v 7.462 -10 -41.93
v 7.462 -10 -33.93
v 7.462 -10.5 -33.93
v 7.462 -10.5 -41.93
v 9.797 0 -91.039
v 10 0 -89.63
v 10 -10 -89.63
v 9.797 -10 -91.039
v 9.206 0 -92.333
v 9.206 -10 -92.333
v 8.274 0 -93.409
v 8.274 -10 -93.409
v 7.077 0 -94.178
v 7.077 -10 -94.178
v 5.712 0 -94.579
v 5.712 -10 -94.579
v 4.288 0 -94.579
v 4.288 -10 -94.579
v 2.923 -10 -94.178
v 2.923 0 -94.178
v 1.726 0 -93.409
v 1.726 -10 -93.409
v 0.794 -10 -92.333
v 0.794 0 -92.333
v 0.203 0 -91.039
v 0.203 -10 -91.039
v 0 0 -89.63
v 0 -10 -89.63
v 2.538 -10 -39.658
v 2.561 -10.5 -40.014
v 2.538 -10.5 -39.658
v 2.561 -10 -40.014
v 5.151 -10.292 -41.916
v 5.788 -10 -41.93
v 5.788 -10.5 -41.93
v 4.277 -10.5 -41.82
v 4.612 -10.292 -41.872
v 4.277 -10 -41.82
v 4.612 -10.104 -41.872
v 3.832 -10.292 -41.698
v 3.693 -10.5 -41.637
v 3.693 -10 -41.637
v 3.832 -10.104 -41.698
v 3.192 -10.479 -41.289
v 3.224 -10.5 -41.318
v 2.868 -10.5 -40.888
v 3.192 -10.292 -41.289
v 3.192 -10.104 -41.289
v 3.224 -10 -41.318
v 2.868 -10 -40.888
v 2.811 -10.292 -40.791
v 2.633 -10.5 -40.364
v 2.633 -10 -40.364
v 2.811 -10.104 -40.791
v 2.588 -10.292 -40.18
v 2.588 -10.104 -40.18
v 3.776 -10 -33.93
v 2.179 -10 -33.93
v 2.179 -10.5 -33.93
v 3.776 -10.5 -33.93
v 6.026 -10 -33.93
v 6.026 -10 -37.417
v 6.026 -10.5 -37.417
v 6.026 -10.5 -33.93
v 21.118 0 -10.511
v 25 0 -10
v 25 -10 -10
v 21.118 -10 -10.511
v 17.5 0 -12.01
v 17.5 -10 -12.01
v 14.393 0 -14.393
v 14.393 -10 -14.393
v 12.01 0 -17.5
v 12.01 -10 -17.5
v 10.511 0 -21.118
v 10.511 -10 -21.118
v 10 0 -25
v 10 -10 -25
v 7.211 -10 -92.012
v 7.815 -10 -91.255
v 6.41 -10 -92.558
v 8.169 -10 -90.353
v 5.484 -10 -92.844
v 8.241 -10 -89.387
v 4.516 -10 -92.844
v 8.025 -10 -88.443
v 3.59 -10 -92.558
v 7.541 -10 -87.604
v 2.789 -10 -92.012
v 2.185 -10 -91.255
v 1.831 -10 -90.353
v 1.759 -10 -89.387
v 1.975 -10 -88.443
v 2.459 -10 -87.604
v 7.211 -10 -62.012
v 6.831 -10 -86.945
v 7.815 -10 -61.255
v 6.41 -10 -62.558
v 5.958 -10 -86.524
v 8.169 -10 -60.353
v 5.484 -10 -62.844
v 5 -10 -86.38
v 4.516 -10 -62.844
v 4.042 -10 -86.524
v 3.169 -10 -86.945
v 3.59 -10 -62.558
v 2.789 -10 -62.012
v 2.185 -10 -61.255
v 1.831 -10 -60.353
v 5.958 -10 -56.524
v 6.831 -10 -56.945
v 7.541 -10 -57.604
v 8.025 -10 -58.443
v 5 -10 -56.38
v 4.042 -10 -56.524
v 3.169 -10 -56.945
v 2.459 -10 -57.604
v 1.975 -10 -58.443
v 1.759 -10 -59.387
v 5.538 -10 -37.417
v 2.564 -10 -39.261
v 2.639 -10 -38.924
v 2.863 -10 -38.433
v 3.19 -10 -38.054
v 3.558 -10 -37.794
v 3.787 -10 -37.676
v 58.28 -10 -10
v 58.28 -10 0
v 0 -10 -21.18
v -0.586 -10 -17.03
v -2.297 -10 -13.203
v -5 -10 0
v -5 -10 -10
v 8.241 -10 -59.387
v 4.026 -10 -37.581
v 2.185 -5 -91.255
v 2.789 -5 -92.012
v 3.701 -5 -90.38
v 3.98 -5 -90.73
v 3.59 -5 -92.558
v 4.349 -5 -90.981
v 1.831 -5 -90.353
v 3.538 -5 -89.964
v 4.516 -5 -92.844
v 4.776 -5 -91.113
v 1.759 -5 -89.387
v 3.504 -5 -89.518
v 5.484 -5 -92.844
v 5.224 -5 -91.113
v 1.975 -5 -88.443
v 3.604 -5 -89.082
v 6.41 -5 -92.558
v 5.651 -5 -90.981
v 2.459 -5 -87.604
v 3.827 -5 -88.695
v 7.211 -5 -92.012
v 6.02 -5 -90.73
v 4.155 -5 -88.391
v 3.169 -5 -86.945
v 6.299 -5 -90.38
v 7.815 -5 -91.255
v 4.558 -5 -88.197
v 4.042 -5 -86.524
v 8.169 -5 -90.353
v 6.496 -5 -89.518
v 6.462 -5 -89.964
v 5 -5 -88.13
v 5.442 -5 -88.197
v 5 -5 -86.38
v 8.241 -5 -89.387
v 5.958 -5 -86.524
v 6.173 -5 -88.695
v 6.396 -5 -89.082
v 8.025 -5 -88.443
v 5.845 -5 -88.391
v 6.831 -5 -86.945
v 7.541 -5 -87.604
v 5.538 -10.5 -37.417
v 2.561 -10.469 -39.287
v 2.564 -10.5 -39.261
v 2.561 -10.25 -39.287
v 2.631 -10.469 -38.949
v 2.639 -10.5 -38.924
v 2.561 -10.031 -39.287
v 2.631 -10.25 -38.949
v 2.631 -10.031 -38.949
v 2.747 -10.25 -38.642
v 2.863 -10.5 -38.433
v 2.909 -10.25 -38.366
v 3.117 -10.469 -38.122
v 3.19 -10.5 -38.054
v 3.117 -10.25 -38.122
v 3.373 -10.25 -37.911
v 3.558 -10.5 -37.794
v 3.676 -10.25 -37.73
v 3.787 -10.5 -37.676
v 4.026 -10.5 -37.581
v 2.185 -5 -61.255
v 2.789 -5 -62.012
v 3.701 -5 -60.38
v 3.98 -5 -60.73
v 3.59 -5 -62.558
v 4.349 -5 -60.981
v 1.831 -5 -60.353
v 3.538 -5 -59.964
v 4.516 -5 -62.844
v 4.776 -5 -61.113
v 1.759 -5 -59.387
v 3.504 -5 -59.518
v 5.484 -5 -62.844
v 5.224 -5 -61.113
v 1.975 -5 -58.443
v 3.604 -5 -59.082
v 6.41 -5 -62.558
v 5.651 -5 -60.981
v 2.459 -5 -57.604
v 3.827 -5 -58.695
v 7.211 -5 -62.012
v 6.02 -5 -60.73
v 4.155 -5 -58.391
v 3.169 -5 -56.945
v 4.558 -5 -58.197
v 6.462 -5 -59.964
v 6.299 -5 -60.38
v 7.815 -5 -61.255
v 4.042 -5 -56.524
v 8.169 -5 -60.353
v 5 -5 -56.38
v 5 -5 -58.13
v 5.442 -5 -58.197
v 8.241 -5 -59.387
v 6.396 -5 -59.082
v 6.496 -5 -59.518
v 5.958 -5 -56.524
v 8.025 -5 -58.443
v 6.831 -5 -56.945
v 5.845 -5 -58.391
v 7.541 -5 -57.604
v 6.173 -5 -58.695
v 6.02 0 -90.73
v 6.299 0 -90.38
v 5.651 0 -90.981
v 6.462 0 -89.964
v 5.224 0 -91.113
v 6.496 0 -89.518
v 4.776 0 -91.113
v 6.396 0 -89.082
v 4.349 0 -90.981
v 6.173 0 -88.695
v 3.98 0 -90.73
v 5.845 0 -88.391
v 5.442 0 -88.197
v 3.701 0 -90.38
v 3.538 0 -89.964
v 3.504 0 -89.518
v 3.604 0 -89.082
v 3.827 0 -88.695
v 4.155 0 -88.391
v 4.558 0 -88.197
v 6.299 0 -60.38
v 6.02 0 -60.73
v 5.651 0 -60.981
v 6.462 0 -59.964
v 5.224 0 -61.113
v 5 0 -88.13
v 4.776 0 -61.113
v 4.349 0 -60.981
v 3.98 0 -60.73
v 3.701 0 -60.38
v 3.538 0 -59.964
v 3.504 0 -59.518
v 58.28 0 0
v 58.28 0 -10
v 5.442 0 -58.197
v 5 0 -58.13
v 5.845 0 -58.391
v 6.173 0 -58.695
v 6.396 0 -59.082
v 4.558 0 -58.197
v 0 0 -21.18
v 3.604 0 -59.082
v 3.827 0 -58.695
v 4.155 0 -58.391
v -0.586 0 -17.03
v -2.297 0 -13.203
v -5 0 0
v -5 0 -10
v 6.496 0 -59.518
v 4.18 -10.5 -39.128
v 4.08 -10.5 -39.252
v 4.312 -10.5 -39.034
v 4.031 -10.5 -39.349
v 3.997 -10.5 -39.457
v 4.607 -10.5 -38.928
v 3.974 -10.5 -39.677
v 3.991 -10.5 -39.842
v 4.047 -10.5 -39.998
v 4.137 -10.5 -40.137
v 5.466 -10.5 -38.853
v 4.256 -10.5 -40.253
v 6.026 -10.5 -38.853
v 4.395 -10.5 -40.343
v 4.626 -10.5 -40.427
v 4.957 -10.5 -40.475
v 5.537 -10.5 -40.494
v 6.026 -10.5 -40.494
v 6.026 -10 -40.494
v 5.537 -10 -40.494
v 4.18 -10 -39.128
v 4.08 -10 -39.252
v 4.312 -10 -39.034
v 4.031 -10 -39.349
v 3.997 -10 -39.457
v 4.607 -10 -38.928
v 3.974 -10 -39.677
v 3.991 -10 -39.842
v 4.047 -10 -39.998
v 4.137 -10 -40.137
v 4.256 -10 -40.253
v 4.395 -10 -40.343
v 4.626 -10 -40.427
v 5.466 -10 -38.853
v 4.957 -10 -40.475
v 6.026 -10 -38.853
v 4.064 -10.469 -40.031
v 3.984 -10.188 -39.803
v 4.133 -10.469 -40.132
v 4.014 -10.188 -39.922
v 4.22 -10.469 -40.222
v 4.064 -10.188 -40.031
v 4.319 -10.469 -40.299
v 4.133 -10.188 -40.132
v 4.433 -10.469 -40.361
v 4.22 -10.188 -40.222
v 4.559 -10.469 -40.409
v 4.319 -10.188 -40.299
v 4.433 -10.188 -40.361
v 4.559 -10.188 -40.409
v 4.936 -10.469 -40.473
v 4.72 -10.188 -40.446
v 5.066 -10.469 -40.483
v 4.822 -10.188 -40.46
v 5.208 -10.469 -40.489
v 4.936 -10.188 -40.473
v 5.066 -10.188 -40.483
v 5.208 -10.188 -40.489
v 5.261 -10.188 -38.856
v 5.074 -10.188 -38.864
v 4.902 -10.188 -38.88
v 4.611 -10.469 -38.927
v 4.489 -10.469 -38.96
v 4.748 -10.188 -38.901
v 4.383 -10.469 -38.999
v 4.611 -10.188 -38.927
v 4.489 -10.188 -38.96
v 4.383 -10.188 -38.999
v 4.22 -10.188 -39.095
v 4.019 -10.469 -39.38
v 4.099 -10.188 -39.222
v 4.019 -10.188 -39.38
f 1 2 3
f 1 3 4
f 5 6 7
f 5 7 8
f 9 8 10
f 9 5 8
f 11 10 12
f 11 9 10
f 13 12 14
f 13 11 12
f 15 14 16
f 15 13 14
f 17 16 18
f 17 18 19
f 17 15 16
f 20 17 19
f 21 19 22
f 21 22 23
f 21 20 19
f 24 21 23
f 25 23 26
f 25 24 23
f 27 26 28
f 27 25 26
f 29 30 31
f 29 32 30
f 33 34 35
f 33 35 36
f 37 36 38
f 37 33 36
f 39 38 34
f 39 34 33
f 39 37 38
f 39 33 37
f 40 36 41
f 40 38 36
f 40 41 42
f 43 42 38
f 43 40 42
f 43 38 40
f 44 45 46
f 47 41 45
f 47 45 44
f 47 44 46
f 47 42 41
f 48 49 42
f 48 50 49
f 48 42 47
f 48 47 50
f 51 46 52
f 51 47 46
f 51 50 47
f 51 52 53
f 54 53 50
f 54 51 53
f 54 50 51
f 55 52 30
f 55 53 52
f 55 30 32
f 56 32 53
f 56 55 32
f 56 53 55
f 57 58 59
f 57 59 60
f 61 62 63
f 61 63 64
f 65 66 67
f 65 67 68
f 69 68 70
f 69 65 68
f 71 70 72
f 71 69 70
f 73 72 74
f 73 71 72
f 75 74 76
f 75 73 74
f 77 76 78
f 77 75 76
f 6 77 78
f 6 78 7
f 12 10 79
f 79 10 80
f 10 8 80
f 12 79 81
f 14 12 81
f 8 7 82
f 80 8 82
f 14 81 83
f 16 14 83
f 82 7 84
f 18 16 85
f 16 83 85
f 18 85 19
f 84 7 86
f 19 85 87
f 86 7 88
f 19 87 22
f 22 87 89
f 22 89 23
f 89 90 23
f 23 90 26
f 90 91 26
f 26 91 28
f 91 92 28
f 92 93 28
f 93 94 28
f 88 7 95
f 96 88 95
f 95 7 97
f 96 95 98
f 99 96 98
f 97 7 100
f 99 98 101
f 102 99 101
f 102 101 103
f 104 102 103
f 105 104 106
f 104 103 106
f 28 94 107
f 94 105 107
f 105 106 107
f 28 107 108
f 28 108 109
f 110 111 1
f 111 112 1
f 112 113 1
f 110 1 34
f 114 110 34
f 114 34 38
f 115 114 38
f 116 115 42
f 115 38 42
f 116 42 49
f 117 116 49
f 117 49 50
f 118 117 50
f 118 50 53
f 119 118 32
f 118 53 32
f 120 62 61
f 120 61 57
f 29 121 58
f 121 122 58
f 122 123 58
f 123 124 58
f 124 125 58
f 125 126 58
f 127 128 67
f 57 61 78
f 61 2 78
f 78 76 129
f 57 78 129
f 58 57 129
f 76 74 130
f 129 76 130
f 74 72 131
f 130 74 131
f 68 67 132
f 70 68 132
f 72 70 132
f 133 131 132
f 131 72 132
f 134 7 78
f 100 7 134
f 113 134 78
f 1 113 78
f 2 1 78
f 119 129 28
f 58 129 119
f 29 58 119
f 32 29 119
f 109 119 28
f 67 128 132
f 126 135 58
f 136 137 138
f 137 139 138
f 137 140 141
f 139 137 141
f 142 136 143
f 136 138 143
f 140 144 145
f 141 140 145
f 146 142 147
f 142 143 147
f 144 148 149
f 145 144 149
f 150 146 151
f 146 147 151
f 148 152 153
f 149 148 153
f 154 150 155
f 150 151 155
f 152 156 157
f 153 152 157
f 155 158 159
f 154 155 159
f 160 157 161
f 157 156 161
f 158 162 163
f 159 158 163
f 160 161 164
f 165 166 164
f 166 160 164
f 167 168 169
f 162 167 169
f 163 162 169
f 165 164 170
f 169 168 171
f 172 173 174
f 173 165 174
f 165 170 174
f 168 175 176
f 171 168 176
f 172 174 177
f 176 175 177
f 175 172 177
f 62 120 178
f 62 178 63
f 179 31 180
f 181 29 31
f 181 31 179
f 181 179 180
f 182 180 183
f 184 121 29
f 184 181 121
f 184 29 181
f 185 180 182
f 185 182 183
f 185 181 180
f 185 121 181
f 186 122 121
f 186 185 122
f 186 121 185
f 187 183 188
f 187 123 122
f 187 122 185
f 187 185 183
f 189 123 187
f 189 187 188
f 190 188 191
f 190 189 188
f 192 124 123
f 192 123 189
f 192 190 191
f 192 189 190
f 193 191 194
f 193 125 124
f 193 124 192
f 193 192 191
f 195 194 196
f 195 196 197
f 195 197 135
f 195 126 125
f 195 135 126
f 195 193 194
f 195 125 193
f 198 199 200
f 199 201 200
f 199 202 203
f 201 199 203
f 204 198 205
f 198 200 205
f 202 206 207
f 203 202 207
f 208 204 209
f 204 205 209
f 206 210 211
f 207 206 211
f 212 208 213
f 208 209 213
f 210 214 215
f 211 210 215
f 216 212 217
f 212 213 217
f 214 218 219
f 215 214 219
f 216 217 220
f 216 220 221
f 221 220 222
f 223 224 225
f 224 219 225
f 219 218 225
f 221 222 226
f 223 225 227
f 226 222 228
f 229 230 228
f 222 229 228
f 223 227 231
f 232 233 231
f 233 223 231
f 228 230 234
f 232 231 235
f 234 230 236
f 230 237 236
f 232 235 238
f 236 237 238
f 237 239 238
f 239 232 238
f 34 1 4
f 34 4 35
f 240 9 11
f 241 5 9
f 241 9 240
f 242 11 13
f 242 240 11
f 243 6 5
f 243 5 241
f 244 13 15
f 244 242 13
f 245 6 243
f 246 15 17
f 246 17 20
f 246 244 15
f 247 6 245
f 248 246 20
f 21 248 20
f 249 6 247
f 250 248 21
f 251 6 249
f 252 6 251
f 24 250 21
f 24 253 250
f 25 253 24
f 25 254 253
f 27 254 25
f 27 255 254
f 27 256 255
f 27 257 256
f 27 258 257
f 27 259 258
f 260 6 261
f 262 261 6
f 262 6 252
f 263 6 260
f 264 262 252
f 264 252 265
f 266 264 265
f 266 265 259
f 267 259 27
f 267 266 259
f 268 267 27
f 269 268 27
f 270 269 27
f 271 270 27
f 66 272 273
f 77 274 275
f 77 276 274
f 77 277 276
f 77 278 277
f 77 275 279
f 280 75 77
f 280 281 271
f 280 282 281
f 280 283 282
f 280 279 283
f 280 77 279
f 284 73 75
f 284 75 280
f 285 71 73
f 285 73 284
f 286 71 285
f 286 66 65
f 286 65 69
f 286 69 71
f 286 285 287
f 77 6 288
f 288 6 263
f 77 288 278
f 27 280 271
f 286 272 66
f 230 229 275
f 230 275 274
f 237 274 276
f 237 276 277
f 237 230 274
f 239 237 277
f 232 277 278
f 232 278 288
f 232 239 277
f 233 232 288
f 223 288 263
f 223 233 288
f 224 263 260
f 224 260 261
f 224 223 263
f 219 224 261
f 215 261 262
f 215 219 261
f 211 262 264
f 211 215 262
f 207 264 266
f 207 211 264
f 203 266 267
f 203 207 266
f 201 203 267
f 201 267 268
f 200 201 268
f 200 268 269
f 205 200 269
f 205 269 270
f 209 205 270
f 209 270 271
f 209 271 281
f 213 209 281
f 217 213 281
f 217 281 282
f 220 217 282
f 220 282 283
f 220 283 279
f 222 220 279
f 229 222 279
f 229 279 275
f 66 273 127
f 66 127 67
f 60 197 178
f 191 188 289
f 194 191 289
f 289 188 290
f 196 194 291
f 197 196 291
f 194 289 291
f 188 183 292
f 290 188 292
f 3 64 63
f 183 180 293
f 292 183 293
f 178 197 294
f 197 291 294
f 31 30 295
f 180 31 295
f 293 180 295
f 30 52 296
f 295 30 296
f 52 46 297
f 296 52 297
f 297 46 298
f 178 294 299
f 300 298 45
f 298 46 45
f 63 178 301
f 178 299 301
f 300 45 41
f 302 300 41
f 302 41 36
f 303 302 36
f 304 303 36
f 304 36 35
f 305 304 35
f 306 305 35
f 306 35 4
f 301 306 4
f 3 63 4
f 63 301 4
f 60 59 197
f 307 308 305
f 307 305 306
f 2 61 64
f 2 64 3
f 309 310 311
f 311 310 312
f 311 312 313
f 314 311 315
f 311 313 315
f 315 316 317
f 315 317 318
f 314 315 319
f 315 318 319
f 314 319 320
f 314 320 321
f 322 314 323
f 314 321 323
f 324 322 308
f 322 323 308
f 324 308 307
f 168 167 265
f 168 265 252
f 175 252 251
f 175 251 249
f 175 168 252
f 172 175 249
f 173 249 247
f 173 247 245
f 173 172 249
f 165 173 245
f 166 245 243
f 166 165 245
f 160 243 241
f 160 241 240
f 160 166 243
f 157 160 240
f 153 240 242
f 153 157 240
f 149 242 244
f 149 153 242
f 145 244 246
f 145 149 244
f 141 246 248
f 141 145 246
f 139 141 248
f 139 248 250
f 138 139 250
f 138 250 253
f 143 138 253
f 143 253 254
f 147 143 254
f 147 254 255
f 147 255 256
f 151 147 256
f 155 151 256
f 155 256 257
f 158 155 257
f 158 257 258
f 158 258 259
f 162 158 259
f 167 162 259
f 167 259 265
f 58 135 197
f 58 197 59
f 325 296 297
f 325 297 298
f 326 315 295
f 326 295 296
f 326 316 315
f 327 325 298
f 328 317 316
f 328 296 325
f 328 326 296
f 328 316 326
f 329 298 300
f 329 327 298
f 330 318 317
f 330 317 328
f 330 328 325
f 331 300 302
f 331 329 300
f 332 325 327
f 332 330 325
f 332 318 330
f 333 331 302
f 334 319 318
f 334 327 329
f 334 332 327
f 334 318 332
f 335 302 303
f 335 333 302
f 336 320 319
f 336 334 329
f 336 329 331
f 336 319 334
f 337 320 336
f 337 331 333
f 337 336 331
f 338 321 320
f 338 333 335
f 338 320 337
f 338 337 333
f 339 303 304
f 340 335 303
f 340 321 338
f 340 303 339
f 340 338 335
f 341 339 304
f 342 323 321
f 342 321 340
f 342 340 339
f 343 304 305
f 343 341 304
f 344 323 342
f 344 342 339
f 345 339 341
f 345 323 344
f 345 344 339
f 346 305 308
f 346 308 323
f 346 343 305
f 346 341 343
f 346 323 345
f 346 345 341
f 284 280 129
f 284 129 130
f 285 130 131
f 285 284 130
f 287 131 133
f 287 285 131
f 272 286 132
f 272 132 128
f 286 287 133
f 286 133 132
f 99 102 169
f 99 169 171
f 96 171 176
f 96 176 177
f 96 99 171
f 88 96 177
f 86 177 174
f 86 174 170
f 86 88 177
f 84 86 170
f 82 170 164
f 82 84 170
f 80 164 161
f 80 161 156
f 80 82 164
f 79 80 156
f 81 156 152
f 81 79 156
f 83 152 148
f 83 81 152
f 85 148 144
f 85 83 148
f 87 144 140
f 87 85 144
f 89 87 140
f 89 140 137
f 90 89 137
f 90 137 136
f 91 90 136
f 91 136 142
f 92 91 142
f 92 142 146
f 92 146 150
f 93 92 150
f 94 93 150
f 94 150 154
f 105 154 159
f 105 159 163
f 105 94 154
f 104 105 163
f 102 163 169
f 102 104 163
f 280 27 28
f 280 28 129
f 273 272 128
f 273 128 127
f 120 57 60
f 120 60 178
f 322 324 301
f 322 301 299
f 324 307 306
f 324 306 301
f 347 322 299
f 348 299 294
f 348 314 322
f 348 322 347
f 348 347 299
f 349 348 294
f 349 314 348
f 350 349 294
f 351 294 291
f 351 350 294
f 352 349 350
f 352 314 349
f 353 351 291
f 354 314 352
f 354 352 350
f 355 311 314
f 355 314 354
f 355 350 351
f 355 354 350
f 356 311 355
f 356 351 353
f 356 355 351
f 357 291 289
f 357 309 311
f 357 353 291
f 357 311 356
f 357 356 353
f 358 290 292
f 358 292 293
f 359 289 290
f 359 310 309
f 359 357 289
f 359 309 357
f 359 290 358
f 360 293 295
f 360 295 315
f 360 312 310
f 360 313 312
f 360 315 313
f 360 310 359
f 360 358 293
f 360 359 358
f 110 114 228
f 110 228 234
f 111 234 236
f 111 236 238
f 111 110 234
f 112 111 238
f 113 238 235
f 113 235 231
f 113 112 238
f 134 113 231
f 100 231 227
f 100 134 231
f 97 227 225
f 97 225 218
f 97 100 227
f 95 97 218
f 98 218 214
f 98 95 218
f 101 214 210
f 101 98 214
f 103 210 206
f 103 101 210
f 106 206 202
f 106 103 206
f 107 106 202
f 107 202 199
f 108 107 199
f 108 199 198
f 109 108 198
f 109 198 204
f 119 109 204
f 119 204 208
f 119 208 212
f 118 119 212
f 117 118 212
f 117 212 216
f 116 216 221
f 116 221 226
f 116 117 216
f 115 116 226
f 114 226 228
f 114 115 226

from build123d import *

# Parameters (mm, degrees)
BOSS_EXTRUDE1_DEPTH = 10
SKETCH2_R           = 1.5
CUT_EXTRUDE1_DEPTH  = 112.585820336
BOSS_EXTRUDE2_DEPTH = 0.5
SKETCH5_R           = 3.25
CUT_EXTRUDE2_DEPTH  = 5
FILLET1_R           = 15


with BuildPart() as part:
    # Sketch1 → Boss-Extrude1 (new body)
    with BuildSketch(Plane(origin=(0, 0, 0), x_dir=(1, 0, 0), z_dir=(0, 1, 0))):
        with BuildLine():
            Line((0, 0), (10, 0))
            Line((10, 0), (58.28, 0))
            Line((58.28, 0), (58.28, 10))
            Line((58.28, 10), (10, 10))
            Line((10, 10), (10, 89.63))
            ThreePointArc((10, 89.63), (5, 94.63), (0, 89.63))
            Line((0, 89.63), (0, 10))
            Line((0, 10), (-5, 10))
            Line((-5, 10), (-5, 0))
            Line((-5, 0), (0, 0))
        make_face()
    extrude(amount=BOSS_EXTRUDE1_DEPTH)

    # Sketch2 → Cut-Extrude1 (cut, through all)
    with BuildSketch(Plane(origin=(0, 10, 0), x_dir=(1, 0, 0), z_dir=(0, 1, 0))):
        with Locations(Location((5, 89.63, 0), (0, 0, 270))):
            Circle(SKETCH2_R)
        with Locations(Location((5, 59.63, 0), (0, 0, 270))):
            Circle(SKETCH2_R)
    extrude(amount=-CUT_EXTRUDE1_DEPTH, mode=Mode.SUBTRACT)

    # Sketch4 → Boss-Extrude2 (add)
    with BuildSketch(Plane(origin=(0, 10, 0), x_dir=(1, 0, 0), z_dir=(0, 1, 0))):
        with BuildLine():
            Line((7.461538462, 41.930004151), (5.788461538, 41.930004151))
            add(Edge.make_bspline(
                [(5.788461538, 41.930004151), (5.677871663, 41.92961162), (5.465176181, 41.928856674), (5.158480914, 41.916945611), (4.876739133, 41.900370391), (4.619533695, 41.875076164), (4.386974636, 41.841539077), (4.178828878, 41.802004401), (3.995102505, 41.756946162), (3.834246039, 41.700800041), (3.689081032, 41.637468067), (3.553767063, 41.564698468), (3.425318906, 41.483301557), (3.304595098, 41.391135559), (3.19054652, 41.289858519), (3.082958012, 41.179368492), (2.983349901, 41.058728567), (2.892338963, 40.928701036), (2.809389819, 40.791915054), (2.736080173, 40.648182815), (2.676464647, 40.497404362), (2.62378794, 40.341758769), (2.585846614, 40.179021052), (2.559458976, 40.010775491), (2.540138981, 39.836429843), (2.539028173, 39.71798715), (2.538461538, 39.657568254)],
                knots=[0, 0, 0, 0, 1.749336639, 3.364467119, 4.854658419, 6.213483162, 7.451590619, 8.570285859, 9.5643256, 10.440900261, 11.26203566, 12.067320669, 12.869050712, 13.665104639, 14.467235401, 15.27997916, 16.102287765, 16.939272006, 17.78853747, 18.631303466, 19.488103222, 20.351255419, 21.228522269, 22.127379805, 23.044756219, 24, 24, 24, 24], degree=3))
            add(Edge.make_bspline(
                [(2.538461538, 39.657568254), (2.539933452, 39.594504805), (2.542819606, 39.470848877), (2.558366003, 39.289208404), (2.586779932, 39.115427505), (2.629816962, 38.950014988), (2.679282438, 38.790912103), (2.745058832, 38.641054396), (2.819293994, 38.498262405), (2.907460927, 38.364555977), (3.004219829, 38.236965223), (3.116748396, 38.120378621), (3.237756507, 38.008530081), (3.374046466, 37.908425416), (3.519610488, 37.81329591), (3.677340774, 37.727083244), (3.846207924, 37.64762023), (3.964929894, 37.603306164), (4.025641026, 37.580645177)],
                knots=[0, 0, 0, 0, 1.099860209, 2.156625411, 3.176576793, 4.16617041, 5.135385252, 6.078461593, 7.016046972, 7.938469504, 8.868247731, 9.803980173, 10.76021508, 11.73834243, 12.748633912, 13.790971185, 14.870363756, 16, 16, 16, 16], degree=3))
            Line((4.025641026, 37.580645177), (2.179487179, 33.930004151))
            Line((2.179487179, 33.930004151), (3.775641026, 33.930004151))
            Line((3.775641026, 33.930004151), (5.538461538, 37.417183638))
            Line((5.538461538, 37.417183638), (6.025641026, 37.417183638))
            Line((6.025641026, 37.417183638), (6.025641026, 33.930004151))
            Line((6.025641026, 33.930004151), (7.461538462, 33.930004151))
            Line((7.461538462, 33.930004151), (7.461538462, 41.930004151))
        make_face()
        with BuildLine():
            Line((6.025641026, 38.853081074), (5.466346154, 38.853081074))
            add(Edge.make_bspline(
                [(5.466346154, 38.853081074), (5.397967707, 38.853851198), (5.267037673, 38.85532582), (5.078743088, 38.862165728), (4.907726699, 38.878646528), (4.753254104, 38.899469401), (4.61454801, 38.923512416), (4.492845628, 38.957967516), (4.386271709, 38.994887028), (4.296089158, 39.040768404), (4.219039259, 39.092945479), (4.152511603, 39.152219935), (4.097483692, 39.220822569), (4.052192915, 39.296889059), (4.016961614, 39.381092194), (3.991245464, 39.472507614), (3.976873938, 39.572176658), (3.975220446, 39.64096187), (3.974358974, 39.676799023)],
                knots=[0, 0, 0, 0, 1.688639943, 3.233382647, 4.650958383, 5.928841754, 7.082724185, 8.122798841, 9.049171256, 9.863274652, 10.613301712, 11.341792392, 12.054588806, 12.776240173, 13.521029143, 14.301969904, 15.115324896, 16, 16, 16, 16], degree=3))
            add(Edge.make_bspline(
                [(3.974358974, 39.676799023), (3.975987665, 39.719196991), (3.979186925, 39.802479943), (4.010933525, 39.922378191), (4.061467254, 40.033352223), (4.130735157, 40.134900631), (4.217969074, 40.223924975), (4.318076877, 40.302400643), (4.433219134, 40.36445333), (4.539832198, 40.405382621), (4.636825167, 40.429871039), (4.724358262, 40.448119591), (4.825722112, 40.461052863), (4.940993243, 40.474770901), (5.069877824, 40.483666354), (5.213078352, 40.490158262), (5.370183559, 40.49281442), (5.479700808, 40.493663547), (5.536858974, 40.494106715)],
                knots=[0, 0, 0, 0, 1.020303359, 2.004196876, 2.966617323, 3.9489082, 4.950758222, 5.960522915, 7.003732012, 8.091992268, 8.70421221, 9.413913587, 10.24622431, 11.166358409, 12.212345909, 13.359657661, 14.621978493, 16, 16, 16, 16], degree=3))
            Line((5.536858974, 40.494106715), (6.025641026, 40.494106715))
            Line((6.025641026, 40.494106715), (6.025641026, 38.853081074))
        make_face(mode=Mode.SUBTRACT)
    extrude(amount=BOSS_EXTRUDE2_DEPTH)

    # Sketch5 → Cut-Extrude2 (cut)
    with BuildSketch(Plane(origin=(0, 10, 0), x_dir=(1, 0, 0), z_dir=(0, 1, 0))):
        with Locations(Location((5, 89.63, 0), (0, 0, 270))):
            Circle(SKETCH5_R)
        with Locations(Location((5, 59.63, 0), (0, 0, 270))):
            Circle(SKETCH5_R)
    extrude(amount=-CUT_EXTRUDE2_DEPTH, mode=Mode.SUBTRACT)


with BuildPart() as body_2:
    # Mirror1: mirrored copy
    add(part.part.mirror(Plane.ZX))

    # Fillet1
    # the kernel refuses this fillet: 15 mm, written as the material it adds along each edge
    with BuildSketch(Plane(origin=(0, 0, -10), x_dir=(-1, 0, 0), z_dir=(0, -1, 0))) as fillet1_piece_1:
        with BuildLine():
            CenterArc((15, 11.180339887), FILLET1_R, 180, 48.189685104)
            Line((0, 11.180339887), (-0.3, 11.180339887))
            Line((-0.3, 11.180339887), (-0.3, 0))
            Line((-0.3, 0), (0, -0.3))
            ThreePointArc((0, -0.3), (2.5, -0.3), (4.8, -0.223606798))
            Line((4.8, -0.223606798), (5, 0))
        make_face()
    extrude(amount=10)
    with BuildSketch(Plane(origin=(10, 0, -10), x_dir=(1, 0, 0), z_dir=(0, -1, 0))) as fillet1_piece_2:
        with BuildLine():
            CenterArc((FILLET1_R, -FILLET1_R), FILLET1_R, 90, 90)
            Line((0, -FILLET1_R), (-FILLET1_R * 0.02, -FILLET1_R))
            Line((-FILLET1_R * 0.02, -FILLET1_R), (-FILLET1_R * 0.02, FILLET1_R * 0.02))
            Line((-FILLET1_R * 0.02, FILLET1_R * 0.02), (FILLET1_R, FILLET1_R * 0.02))
            Line((FILLET1_R, FILLET1_R * 0.02), (FILLET1_R, 0))
        make_face()
    extrude(amount=10)


solid = body_2.part
